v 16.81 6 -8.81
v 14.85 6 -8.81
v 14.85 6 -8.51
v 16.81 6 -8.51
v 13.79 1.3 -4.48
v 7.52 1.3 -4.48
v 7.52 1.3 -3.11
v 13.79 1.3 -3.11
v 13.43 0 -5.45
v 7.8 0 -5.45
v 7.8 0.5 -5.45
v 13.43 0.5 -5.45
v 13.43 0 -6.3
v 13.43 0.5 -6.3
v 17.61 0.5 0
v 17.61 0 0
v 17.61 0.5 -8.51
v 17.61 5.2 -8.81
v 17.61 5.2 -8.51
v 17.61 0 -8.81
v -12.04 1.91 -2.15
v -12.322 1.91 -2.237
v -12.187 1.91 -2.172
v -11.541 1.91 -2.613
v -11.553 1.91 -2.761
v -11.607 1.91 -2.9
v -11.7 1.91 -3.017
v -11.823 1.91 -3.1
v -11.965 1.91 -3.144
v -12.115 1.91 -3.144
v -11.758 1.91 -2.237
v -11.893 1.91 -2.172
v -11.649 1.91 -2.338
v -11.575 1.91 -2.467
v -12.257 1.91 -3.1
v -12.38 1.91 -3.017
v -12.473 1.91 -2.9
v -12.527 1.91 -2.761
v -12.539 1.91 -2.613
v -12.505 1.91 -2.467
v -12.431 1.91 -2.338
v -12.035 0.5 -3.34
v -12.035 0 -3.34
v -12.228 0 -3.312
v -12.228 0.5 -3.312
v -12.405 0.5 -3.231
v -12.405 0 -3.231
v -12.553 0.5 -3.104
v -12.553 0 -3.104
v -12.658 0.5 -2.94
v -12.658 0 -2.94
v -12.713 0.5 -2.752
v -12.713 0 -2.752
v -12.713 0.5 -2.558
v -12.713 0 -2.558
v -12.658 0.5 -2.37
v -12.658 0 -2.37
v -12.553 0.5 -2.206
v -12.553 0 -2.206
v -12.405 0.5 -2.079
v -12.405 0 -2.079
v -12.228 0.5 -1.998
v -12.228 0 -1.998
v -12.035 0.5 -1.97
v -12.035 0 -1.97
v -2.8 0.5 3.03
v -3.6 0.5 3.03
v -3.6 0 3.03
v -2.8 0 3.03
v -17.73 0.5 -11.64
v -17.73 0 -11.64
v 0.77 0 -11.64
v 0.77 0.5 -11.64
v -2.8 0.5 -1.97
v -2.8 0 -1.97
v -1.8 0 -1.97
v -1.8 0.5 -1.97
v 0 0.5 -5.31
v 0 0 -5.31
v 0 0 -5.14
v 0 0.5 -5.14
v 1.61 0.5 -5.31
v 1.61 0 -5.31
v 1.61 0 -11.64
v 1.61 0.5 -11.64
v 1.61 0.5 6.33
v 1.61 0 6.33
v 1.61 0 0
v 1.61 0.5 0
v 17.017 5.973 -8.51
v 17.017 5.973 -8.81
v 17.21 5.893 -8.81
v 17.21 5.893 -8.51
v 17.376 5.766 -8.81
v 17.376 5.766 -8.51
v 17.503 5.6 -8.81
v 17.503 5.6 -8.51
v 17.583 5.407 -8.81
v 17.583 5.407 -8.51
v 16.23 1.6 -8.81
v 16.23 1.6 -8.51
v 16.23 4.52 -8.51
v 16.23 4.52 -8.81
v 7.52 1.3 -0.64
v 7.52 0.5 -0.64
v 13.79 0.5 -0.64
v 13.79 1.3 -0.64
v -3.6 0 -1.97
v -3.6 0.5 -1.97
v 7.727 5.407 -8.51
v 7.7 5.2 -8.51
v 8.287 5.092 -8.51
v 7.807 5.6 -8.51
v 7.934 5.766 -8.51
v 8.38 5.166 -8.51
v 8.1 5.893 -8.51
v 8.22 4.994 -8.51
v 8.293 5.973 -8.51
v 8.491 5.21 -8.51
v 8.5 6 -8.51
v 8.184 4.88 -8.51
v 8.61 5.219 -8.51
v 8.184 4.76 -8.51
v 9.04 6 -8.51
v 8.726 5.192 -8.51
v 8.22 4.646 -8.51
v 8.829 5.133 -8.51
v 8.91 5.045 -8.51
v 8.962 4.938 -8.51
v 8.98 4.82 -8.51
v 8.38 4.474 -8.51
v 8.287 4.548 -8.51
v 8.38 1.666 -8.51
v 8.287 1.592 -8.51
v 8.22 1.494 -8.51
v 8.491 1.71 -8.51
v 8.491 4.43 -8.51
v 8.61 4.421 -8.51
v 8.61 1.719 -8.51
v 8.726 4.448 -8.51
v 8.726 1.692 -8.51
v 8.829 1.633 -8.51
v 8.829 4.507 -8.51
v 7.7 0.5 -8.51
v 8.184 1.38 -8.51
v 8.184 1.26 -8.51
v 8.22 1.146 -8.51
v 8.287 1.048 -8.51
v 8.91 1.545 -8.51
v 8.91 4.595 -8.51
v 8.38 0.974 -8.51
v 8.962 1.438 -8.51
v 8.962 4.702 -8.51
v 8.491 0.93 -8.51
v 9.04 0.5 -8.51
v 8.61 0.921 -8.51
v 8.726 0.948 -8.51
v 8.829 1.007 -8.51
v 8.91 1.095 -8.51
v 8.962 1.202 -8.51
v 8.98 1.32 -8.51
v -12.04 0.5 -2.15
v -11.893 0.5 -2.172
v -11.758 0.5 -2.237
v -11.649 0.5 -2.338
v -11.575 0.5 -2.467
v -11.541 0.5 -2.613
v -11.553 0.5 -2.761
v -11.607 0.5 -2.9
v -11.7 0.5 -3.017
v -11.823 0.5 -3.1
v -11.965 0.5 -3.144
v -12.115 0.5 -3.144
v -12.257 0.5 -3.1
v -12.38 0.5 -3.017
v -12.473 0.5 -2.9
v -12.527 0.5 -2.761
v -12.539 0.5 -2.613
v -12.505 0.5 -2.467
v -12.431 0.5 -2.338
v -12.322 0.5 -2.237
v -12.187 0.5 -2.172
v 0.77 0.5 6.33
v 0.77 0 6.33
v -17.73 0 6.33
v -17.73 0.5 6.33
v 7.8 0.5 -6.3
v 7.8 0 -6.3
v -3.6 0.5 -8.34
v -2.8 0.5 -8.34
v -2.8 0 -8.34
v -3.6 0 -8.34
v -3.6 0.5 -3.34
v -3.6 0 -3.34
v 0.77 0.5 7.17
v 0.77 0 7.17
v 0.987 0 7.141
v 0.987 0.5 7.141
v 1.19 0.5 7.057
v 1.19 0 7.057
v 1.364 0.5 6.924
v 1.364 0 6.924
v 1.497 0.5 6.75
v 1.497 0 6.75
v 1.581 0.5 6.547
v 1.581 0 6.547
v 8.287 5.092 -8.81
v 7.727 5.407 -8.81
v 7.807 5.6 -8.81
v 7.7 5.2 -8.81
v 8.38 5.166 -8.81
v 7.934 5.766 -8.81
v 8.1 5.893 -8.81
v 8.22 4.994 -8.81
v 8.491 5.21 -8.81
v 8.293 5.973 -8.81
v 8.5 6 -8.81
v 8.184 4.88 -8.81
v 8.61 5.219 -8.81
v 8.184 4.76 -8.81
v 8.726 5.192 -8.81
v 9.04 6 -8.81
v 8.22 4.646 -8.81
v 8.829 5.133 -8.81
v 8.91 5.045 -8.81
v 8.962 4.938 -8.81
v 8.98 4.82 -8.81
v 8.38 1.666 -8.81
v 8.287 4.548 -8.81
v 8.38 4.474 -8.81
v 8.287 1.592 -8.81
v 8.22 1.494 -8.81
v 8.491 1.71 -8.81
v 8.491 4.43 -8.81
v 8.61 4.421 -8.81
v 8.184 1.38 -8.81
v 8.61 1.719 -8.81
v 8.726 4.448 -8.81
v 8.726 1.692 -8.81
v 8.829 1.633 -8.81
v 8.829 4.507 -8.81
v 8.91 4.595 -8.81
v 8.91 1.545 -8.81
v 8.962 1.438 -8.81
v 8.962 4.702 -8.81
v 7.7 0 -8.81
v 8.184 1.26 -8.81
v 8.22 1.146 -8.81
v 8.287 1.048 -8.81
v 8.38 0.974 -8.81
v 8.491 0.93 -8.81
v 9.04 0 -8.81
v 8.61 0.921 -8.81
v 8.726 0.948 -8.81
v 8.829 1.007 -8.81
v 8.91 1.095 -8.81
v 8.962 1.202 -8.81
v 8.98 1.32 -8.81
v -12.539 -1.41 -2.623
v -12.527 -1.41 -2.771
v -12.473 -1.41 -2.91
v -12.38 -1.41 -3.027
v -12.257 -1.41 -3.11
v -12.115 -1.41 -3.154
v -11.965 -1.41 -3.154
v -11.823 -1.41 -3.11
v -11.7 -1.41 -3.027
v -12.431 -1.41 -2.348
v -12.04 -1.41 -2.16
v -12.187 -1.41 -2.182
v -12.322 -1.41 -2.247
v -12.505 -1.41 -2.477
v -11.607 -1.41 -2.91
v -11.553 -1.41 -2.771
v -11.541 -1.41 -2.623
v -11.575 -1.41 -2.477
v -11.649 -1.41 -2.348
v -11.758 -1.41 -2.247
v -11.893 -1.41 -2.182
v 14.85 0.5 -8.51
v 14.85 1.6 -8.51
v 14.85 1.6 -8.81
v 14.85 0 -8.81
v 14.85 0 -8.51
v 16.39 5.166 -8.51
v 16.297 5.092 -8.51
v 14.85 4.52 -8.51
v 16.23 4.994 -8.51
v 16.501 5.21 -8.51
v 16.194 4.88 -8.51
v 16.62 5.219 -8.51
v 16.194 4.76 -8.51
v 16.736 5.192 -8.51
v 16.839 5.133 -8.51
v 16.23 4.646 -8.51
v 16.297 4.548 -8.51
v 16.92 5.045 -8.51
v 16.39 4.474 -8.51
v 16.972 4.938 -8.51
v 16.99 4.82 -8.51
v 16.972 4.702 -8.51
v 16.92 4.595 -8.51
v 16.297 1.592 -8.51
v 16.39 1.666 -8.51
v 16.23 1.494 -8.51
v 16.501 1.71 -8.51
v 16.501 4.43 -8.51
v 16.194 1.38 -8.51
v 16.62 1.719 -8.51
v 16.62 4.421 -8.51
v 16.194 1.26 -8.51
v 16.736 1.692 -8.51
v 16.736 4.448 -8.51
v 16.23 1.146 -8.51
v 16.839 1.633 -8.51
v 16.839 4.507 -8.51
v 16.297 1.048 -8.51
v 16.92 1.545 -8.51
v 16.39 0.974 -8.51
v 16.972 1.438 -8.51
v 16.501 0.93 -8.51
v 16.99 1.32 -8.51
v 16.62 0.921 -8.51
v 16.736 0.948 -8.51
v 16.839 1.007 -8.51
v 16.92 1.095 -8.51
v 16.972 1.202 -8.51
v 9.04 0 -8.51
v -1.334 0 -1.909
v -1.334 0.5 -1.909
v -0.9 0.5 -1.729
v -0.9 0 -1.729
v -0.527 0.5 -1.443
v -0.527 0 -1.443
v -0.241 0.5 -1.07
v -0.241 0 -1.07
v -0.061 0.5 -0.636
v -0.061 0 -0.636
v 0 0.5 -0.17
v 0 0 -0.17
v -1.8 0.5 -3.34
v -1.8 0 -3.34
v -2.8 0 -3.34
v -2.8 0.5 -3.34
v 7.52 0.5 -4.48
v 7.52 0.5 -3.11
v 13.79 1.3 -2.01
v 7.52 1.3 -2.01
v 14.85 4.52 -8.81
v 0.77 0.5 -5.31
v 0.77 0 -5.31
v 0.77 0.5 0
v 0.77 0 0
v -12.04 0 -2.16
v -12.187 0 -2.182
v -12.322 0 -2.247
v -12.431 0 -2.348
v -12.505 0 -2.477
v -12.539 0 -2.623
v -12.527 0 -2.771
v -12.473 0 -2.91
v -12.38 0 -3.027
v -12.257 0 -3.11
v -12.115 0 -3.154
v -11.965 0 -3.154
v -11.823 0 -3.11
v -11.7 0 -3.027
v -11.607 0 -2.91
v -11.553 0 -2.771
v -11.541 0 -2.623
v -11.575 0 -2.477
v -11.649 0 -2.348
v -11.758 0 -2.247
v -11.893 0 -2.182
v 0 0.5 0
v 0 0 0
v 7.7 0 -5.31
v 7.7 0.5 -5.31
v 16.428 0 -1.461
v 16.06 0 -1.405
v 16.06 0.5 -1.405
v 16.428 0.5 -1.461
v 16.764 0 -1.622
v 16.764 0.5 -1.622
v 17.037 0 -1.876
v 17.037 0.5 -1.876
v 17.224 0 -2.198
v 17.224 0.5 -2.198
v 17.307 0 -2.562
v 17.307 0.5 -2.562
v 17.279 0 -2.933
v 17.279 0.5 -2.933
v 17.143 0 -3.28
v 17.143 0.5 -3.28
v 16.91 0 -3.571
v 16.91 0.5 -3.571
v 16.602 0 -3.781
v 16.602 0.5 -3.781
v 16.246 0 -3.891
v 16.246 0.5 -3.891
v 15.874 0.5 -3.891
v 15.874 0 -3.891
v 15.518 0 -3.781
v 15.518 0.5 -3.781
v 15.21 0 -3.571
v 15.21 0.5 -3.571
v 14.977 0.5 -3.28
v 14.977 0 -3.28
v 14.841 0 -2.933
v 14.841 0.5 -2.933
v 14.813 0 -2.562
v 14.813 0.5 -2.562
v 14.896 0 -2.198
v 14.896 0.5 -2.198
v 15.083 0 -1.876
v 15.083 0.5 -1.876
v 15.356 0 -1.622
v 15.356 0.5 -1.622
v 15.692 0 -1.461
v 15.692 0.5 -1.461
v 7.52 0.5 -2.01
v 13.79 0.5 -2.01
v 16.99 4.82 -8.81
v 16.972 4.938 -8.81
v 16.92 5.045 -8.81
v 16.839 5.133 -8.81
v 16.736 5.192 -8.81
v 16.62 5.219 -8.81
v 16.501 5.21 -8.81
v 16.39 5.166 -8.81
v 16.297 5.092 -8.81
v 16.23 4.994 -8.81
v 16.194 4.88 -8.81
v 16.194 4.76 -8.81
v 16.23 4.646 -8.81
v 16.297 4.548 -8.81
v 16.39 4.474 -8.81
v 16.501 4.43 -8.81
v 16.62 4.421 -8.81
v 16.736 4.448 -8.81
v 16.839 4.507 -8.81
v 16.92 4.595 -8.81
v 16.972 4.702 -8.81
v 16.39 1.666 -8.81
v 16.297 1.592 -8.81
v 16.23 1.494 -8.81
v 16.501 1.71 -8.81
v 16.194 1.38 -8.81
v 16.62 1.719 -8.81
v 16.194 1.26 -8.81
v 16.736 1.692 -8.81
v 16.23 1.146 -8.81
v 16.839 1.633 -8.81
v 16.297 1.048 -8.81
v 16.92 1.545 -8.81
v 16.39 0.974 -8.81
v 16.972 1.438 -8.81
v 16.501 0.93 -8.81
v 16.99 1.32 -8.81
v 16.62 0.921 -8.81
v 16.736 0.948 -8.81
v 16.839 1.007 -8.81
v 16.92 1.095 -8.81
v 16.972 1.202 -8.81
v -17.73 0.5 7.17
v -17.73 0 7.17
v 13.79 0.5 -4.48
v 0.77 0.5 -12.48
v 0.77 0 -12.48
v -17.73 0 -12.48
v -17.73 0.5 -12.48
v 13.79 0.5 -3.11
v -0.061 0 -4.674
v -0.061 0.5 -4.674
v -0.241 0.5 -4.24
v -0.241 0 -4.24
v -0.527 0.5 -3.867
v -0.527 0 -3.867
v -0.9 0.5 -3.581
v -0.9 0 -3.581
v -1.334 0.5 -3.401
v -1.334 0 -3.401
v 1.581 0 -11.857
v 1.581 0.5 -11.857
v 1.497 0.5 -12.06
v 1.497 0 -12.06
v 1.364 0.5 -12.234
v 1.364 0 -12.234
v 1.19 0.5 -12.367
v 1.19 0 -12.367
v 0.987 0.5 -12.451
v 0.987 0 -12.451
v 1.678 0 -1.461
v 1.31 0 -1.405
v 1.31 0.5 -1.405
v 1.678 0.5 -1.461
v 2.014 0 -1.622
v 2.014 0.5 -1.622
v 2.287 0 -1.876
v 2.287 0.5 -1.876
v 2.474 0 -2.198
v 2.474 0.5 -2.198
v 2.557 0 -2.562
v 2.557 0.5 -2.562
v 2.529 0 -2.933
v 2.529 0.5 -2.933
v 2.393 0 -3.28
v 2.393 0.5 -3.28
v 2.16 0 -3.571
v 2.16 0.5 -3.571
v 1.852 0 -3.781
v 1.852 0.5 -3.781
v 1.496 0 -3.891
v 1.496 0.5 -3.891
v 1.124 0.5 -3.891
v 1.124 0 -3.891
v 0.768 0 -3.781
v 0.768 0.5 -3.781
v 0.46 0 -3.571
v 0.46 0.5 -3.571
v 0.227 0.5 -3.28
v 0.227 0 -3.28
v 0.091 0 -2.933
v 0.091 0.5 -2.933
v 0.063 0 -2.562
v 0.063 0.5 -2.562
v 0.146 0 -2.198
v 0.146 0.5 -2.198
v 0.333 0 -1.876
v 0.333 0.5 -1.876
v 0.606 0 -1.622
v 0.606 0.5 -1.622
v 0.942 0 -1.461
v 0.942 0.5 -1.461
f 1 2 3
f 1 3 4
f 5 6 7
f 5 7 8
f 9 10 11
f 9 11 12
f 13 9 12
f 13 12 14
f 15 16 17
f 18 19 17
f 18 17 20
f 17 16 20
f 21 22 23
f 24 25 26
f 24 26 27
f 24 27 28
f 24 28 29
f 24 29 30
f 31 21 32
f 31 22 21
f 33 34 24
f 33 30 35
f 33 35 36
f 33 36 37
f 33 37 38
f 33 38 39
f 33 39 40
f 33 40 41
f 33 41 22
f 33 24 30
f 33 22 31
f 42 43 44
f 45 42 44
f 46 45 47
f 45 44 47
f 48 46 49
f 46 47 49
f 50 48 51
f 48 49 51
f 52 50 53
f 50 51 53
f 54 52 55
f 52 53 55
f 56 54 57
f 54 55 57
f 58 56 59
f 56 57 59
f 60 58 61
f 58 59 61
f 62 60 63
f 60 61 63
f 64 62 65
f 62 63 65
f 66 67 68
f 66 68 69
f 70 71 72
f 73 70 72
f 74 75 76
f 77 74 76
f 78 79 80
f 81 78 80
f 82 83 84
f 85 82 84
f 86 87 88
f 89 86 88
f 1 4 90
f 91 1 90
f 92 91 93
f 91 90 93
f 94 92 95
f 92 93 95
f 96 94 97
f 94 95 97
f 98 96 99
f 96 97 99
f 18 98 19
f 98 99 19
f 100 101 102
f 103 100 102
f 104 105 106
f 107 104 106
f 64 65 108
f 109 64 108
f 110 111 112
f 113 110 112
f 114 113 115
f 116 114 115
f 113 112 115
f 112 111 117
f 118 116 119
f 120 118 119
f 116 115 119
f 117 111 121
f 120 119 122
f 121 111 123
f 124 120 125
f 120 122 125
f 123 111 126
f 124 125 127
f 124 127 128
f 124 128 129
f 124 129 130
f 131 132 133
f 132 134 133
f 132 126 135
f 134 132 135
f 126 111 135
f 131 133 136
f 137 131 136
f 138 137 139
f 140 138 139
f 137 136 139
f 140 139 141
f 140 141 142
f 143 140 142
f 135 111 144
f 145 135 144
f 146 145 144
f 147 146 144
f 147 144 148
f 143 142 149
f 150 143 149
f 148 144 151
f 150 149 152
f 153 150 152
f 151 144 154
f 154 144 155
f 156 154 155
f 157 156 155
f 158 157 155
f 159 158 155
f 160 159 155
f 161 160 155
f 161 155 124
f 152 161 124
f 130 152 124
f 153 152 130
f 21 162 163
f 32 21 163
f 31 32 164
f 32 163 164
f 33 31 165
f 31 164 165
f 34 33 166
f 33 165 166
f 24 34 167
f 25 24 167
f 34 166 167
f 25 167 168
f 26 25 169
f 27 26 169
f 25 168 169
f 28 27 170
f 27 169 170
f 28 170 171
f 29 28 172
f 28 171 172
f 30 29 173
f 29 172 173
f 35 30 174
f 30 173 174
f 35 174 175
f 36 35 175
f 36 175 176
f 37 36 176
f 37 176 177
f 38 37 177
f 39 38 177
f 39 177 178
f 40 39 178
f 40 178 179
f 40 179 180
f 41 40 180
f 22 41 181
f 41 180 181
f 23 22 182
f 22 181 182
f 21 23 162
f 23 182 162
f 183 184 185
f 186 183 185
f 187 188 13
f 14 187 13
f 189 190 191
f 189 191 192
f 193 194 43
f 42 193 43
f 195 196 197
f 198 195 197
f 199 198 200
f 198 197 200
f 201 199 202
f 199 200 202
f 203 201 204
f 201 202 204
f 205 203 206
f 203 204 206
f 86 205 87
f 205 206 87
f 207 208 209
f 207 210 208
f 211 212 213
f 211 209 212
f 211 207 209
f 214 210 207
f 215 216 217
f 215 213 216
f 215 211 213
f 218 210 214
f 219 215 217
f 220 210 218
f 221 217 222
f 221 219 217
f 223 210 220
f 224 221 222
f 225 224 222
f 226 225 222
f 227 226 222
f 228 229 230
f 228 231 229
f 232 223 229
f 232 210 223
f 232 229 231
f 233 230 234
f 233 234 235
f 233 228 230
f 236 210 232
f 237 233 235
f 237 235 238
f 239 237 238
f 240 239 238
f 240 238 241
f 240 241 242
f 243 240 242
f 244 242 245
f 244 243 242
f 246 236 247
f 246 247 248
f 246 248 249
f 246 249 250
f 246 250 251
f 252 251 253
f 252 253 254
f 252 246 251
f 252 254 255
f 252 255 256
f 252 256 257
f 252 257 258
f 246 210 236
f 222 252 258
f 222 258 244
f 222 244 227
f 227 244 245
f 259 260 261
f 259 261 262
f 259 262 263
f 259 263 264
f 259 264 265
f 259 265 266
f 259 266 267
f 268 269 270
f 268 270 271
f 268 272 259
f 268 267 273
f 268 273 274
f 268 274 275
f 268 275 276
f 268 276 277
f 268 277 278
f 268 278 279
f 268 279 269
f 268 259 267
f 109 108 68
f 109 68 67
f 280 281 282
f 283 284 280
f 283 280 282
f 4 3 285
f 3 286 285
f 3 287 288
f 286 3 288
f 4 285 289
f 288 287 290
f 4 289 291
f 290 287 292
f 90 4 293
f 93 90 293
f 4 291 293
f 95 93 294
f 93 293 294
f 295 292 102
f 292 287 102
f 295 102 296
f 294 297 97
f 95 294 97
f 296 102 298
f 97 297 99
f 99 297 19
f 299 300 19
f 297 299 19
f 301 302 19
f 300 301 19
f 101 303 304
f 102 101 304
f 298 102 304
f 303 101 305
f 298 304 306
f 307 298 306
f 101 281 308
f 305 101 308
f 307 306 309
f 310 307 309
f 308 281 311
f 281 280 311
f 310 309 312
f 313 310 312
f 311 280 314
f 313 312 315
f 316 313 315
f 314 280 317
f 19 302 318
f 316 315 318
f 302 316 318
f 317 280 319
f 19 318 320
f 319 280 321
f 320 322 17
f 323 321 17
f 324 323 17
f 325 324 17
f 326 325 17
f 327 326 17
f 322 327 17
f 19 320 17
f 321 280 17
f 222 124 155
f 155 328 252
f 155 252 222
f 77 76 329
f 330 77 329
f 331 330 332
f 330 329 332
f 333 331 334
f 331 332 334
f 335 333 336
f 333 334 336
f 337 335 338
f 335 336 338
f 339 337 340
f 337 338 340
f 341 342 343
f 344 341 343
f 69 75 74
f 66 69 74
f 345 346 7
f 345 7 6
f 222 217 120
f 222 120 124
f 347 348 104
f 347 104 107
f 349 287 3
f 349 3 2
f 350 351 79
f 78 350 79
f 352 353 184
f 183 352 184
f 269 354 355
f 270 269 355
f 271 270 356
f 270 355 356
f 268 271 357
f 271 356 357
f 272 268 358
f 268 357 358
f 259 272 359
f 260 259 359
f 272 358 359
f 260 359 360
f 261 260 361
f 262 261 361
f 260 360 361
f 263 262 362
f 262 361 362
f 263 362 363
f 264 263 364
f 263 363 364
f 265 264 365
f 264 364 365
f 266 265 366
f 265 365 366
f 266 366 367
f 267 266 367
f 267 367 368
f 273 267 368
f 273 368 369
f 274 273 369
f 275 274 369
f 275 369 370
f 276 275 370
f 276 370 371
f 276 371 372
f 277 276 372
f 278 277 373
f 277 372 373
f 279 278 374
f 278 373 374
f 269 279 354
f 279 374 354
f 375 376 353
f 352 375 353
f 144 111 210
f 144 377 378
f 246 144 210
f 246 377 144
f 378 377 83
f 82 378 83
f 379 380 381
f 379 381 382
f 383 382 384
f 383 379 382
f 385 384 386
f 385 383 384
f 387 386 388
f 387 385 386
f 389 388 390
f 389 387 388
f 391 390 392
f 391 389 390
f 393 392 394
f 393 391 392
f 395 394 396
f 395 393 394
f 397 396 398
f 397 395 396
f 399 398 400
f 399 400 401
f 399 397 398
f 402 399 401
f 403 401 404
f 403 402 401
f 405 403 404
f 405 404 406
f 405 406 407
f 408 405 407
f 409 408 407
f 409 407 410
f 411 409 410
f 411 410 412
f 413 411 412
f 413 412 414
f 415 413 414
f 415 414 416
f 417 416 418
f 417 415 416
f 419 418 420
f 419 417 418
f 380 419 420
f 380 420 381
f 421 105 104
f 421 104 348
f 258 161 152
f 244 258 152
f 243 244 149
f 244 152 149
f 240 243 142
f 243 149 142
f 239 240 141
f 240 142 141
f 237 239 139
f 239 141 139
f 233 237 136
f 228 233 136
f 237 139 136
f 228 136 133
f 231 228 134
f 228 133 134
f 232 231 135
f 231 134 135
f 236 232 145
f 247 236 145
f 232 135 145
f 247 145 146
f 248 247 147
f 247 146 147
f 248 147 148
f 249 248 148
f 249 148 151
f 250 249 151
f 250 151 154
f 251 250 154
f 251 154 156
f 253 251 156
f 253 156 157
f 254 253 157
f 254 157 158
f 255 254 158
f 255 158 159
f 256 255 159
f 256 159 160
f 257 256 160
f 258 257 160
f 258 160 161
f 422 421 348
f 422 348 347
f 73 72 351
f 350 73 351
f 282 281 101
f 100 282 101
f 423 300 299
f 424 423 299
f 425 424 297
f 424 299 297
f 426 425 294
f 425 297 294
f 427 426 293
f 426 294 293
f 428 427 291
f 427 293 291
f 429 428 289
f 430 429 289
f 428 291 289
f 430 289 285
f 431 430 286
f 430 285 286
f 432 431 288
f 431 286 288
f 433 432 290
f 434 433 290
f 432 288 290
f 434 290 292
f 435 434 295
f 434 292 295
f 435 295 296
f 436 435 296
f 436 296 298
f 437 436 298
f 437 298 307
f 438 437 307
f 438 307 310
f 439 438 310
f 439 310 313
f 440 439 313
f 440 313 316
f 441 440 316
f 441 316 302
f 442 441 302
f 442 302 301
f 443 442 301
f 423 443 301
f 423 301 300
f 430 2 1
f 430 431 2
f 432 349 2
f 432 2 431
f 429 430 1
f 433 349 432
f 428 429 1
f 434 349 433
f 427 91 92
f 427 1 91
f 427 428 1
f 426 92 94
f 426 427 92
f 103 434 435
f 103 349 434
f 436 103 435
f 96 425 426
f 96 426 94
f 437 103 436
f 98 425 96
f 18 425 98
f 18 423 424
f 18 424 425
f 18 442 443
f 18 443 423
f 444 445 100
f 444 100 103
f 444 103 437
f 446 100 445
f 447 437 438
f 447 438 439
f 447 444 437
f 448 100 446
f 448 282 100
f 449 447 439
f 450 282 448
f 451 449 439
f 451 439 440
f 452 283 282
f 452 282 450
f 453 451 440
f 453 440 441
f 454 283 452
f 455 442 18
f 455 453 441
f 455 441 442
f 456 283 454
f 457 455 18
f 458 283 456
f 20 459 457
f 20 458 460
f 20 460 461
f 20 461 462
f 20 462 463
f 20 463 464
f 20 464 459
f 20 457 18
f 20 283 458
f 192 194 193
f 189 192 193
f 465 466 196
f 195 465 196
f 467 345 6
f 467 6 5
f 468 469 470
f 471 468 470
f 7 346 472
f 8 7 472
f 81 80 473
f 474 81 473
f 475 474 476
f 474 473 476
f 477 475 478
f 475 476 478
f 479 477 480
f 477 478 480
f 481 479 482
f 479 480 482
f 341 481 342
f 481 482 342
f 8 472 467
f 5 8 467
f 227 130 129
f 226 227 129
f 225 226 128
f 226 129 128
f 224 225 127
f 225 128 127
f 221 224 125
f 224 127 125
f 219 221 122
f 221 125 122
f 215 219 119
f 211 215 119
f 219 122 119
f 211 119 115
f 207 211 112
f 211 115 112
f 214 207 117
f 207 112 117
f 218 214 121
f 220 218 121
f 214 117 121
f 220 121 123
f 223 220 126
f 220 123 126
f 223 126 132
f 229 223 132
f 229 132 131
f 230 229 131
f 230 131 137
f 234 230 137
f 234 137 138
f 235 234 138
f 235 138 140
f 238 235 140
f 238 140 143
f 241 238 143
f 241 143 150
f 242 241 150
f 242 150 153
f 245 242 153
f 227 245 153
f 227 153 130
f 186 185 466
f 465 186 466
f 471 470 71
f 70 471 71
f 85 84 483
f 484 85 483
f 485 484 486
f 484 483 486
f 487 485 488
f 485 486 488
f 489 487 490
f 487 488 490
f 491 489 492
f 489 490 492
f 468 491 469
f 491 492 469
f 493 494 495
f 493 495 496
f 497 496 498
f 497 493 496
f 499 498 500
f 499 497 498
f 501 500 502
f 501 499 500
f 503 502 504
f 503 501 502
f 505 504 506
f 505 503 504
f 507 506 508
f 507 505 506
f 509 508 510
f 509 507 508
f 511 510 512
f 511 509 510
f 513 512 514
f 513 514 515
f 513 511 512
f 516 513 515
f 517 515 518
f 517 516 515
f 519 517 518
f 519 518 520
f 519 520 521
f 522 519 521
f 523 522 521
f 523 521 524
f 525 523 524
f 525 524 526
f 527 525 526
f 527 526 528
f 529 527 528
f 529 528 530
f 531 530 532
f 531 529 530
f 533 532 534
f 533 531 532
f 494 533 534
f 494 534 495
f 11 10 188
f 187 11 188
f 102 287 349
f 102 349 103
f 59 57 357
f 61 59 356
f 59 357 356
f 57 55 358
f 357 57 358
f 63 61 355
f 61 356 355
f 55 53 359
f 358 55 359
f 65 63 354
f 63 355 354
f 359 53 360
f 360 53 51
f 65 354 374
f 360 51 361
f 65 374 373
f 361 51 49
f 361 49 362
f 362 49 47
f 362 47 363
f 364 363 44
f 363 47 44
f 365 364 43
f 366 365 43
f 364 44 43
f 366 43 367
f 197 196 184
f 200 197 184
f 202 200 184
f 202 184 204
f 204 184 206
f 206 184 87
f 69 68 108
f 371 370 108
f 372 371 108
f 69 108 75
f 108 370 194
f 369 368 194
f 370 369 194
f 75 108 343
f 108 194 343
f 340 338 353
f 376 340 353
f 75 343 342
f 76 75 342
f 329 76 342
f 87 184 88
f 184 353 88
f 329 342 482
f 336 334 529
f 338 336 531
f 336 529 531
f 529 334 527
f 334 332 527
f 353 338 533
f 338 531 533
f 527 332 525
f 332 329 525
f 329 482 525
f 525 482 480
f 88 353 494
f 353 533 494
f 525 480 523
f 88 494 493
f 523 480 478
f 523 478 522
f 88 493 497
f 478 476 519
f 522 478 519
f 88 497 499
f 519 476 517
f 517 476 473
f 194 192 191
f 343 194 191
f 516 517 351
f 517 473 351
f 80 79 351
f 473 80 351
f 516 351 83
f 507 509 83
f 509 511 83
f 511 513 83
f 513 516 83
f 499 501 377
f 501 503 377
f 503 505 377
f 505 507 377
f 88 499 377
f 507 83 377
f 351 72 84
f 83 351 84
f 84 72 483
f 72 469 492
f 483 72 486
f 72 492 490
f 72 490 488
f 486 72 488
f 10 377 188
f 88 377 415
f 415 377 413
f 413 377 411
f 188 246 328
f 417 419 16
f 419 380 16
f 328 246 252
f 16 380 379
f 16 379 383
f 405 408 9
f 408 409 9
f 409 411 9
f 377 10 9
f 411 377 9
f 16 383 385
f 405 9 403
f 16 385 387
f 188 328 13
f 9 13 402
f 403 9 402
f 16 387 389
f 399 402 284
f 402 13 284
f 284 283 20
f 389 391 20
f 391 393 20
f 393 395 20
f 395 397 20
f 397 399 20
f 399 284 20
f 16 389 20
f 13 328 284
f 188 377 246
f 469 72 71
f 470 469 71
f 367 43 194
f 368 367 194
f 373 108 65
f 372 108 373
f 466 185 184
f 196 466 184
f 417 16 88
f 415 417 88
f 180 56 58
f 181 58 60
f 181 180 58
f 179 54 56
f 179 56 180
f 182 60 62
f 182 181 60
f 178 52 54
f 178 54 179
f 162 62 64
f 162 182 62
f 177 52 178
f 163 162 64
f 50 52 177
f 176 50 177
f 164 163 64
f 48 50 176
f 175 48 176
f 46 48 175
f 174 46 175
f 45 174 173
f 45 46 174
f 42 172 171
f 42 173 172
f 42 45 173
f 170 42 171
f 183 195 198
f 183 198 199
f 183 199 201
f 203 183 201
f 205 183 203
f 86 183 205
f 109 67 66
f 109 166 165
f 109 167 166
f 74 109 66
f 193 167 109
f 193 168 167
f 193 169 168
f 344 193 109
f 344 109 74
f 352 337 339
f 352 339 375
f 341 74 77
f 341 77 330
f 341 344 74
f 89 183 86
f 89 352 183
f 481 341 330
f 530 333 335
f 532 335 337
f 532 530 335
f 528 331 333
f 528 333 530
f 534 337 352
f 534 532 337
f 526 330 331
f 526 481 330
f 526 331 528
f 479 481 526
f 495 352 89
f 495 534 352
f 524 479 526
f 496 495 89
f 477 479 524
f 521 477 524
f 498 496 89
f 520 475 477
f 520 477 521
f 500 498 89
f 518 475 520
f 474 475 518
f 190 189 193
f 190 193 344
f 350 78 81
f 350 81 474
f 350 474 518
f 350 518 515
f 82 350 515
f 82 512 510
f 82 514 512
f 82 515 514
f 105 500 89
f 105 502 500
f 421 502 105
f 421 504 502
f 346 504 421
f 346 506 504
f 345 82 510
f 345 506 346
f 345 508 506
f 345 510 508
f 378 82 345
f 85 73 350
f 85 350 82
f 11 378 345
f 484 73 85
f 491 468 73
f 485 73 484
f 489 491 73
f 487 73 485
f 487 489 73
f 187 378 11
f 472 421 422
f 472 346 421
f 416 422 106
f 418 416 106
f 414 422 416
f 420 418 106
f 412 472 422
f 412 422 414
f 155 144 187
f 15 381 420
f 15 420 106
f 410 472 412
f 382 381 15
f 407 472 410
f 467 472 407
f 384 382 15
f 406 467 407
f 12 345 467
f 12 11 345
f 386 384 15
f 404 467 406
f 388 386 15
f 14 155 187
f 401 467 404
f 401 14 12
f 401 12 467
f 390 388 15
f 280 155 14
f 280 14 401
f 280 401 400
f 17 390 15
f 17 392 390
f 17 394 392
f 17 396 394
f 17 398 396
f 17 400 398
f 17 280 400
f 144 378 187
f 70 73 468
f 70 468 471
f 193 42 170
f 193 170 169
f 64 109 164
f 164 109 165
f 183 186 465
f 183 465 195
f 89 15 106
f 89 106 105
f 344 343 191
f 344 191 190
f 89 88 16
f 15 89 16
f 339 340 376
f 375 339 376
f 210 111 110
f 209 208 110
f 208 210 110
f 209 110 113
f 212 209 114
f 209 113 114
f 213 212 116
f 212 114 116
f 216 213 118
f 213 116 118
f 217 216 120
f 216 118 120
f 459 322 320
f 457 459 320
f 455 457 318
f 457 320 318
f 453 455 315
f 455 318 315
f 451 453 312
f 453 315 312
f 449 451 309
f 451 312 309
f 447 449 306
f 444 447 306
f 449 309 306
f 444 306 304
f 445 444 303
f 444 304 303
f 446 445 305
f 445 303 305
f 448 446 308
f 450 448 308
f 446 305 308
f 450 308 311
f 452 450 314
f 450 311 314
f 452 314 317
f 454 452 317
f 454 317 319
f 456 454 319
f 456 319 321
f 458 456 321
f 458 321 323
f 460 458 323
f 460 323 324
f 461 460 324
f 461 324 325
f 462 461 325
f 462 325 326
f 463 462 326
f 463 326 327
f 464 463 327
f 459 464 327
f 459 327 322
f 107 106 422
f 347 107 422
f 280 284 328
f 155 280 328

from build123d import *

# Parameters (mm, degrees)
SKETCH1_W           = 6.27
SKETCH1_H           = 1.37
SKETCH1_R           = 1.25
SKETCH1_W_2         = 5.63
SKETCH1_H_2         = 0.85
SKETCH1_R_2         = 0.685
SKETCH1_R_3         = 0.5
SKETCH1_W_3         = 1.34
SKETCH1_H_3         = 0.3
SKETCH1_W_4         = 2.76
BOSS_EXTRUDE2_DEPTH = 0.5
SKETCH4_R           = 0.5
BOSS_EXTRUDE3_DEPTH = 1.41
SKETCH5_R           = 0.5
BOSS_EXTRUDE4_DEPTH = 1.41
SKETCH6_W           = 6.27
SKETCH6_H           = 1.37
BOSS_EXTRUDE5_DEPTH = 0.8
SKETCH7_W           = 1.34
SKETCH7_H           = 0.3
SKETCH7_W_2         = 2.76
BOSS_EXTRUDE6_DEPTH = 5.5
SKETCH8_W           = 1.38
SKETCH8_H           = 2.92
CUT_EXTRUDE1_DEPTH  = 5.5
SKETCH9_R           = 0.4
CUT_EXTRUDE2_DEPTH  = 5.5
SKETCH10_R          = 0.4
CUT_EXTRUDE4_DEPTH  = 5.5
SKETCH11_W          = 0.8
SKETCH11_H          = 0.5
BOSS_EXTRUDE7_DEPTH = 5
SKETCH12_W          = 0.8
SKETCH12_H          = 0.5
BOSS_EXTRUDE8_DEPTH = 5


with BuildPart() as part:
    # Sketch1 → Boss-Extrude2 (new body)
    # profile 1 of 9: a face of its own
    with BuildSketch(Plane(origin=(0, 0, 0), x_dir=(1, 0, 0), z_dir=(0, 1, 0))):
        with BuildLine():
            Line((0, 5.31), (0, 5.14))
            ThreePointArc((0, 5.14), (-0.527207794, 3.867207794), (-1.8, 3.34))
            Line((-1.8, 3.34), (-12.035, 3.34))
            ThreePointArc((-12.035, 3.34), (-11.550631855, 3.139368145), (-11.35, 2.655))
            ThreePointArc((-11.35, 2.655), (-11.550631855, 2.170631855), (-12.035, 1.97))
            Line((-12.035, 1.97), (-1.8, 1.97))
            ThreePointArc((-1.8, 1.97), (-0.527207794, 1.442792206), (0, 0.17))
            Line((0, 0.17), (0, 0))
            Line((0, 0), (0.77, 0))
            Line((0.77, 0), (1.61, 0))
            Line((1.61, 0), (17.61, 0))
            Line((17.61, 0), (17.61, 8.51))
            Line((17.61, 8.51), (14.85, 8.51))
            Line((14.85, 8.51), (9.04, 8.51))
            Line((9.04, 8.51), (7.7, 8.51))
            Line((7.7, 8.51), (7.7, 5.31))
            Line((7.7, 5.31), (1.61, 5.31))
            Line((1.61, 5.31), (0.77, 5.31))
            Line((0.77, 5.31), (0, 5.31))
        make_face()
        with Locations((10.655, 1.325)):
            Rectangle(SKETCH1_W, SKETCH1_H, mode=Mode.SUBTRACT)
        with Locations(Location((1.31, 2.655, 0), (0, 0, 270))):
            Circle(SKETCH1_R, mode=Mode.SUBTRACT)
        with Locations((10.655, 3.795)):
            Rectangle(SKETCH1_W, SKETCH1_H, mode=Mode.SUBTRACT)
        with Locations(Location((16.06, 2.655, 0), (0, 0, 270))):
            Circle(SKETCH1_R, mode=Mode.SUBTRACT)
        with Locations((10.615, 5.875)):
            Rectangle(SKETCH1_W_2, SKETCH1_H_2, mode=Mode.SUBTRACT)
    # profile 2 of 9: a face of its own
    with BuildSketch(Plane(origin=(0, 0, 0), x_dir=(1, 0, 0), z_dir=(0, 1, 0))):
        with BuildLine():
            Line((0.77, 11.64), (0.77, 5.31))
            Line((0.77, 5.31), (1.61, 5.31))
            Line((1.61, 5.31), (1.61, 11.64))
            ThreePointArc((1.61, 11.64), (1.363969696, 12.233969696), (0.77, 12.48))
            Line((0.77, 12.48), (-17.73, 12.48))
            Line((-17.73, 12.48), (-17.73, 11.64))
            Line((-17.73, 11.64), (0.77, 11.64))
        make_face()
    # profile 3 of 9: a face of its own
    with BuildSketch(Plane(origin=(0, 0, 0), x_dir=(1, 0, 0), z_dir=(0, 1, 0))):
        with BuildLine():
            Line((1.61, 0), (0.77, 0))
            Line((0.77, 0), (0.77, -6.33))
            Line((0.77, -6.33), (-17.73, -6.33))
            Line((-17.73, -6.33), (-17.73, -7.17))
            Line((-17.73, -7.17), (0.77, -7.17))
            ThreePointArc((0.77, -7.17), (1.363969696, -6.923969696), (1.61, -6.33))
            Line((1.61, -6.33), (1.61, 0))
        make_face()
    # profile 4 of 9: a face of its own
    with BuildSketch(Plane(origin=(0, 0, 0), x_dir=(1, 0, 0), z_dir=(0, 1, 0))):
        with Locations((10.655, 1.325)):
            Rectangle(SKETCH1_W, SKETCH1_H)
    # profile 5 of 9: a face of its own
    with BuildSketch(Plane(origin=(0, 0, 0), x_dir=(1, 0, 0), z_dir=(0, 1, 0))):
        with Locations((10.655, 3.795)):
            Rectangle(SKETCH1_W, SKETCH1_H)
    # profile 6 of 9: a face of its own
    with BuildSketch(Plane(origin=(0, 0, 0), x_dir=(1, 0, 0), z_dir=(0, 1, 0))):
        with Locations((-12.035, 2.655)):
            Circle(SKETCH1_R_2)
        with Locations((-12.035, 2.655)):
            Circle(SKETCH1_R_3, mode=Mode.SUBTRACT)
    # profile 7 of 9: a face of its own
    with BuildSketch(Plane(origin=(0, 0, 0), x_dir=(1, 0, 0), z_dir=(0, 1, 0))):
        with Locations((-12.035, 2.655)):
            Circle(SKETCH1_R_3)
    # profile 8 of 9: a face of its own
    with BuildSketch(Plane(origin=(0, 0, 0), x_dir=(1, 0, 0), z_dir=(0, 1, 0))):
        with Locations((8.37, 8.66)):
            Rectangle(SKETCH1_W_3, SKETCH1_H_3)
    # profile 9 of 9: a face of its own
    with BuildSketch(Plane(origin=(0, 0, 0), x_dir=(1, 0, 0), z_dir=(0, 1, 0))):
        with Locations((16.23, 8.66)):
            Rectangle(SKETCH1_W_4, SKETCH1_H_3)
    extrude(amount=BOSS_EXTRUDE2_DEPTH)

    # Sketch4 → Boss-Extrude3 (add)
    with BuildSketch(Plane(origin=(0, 0.5, 0), x_dir=(1, 0, 0), z_dir=(0, 1, 0))):
        with Locations(Location((-12.040018383, 2.65, 0), (0, 0, 270))):
            Circle(SKETCH4_R)
    extrude(amount=BOSS_EXTRUDE3_DEPTH)

    # Sketch5 → Boss-Extrude4 (add)
    with BuildSketch(Plane.XZ):
        with Locations(Location((-12.04, -2.66, 0), (0, 0, 90))):
            Circle(SKETCH5_R)
    extrude(amount=BOSS_EXTRUDE4_DEPTH)

    # Sketch6 → Boss-Extrude5 (add)
    with BuildSketch(Plane(origin=(0, 0.5, 0), x_dir=(1, 0, 0), z_dir=(0, 1, 0))):
        with Locations((10.655, 3.795)):
            Rectangle(SKETCH6_W, SKETCH6_H)
        with Locations((10.655, 1.325)):
            Rectangle(SKETCH6_W, SKETCH6_H)
    extrude(amount=BOSS_EXTRUDE5_DEPTH)

    # Sketch7 → Boss-Extrude6 (add)
    with BuildSketch(Plane(origin=(0, 0.5, 0), x_dir=(1, 0, 0), z_dir=(0, 1, 0))):
        with Locations((8.37, 8.66)):
            Rectangle(SKETCH7_W, SKETCH7_H)
        with Locations((16.23, 8.66)):
            Rectangle(SKETCH7_W_2, SKETCH7_H)
    extrude(amount=BOSS_EXTRUDE6_DEPTH)

    # Sketch8 → Cut-Extrude1 (cut)
    with BuildSketch(Plane.XY.offset(-8.51)):
        with Locations((15.54, 3.06)):
            Rectangle(SKETCH8_W, SKETCH8_H)
    extrude(amount=-CUT_EXTRUDE1_DEPTH, mode=Mode.SUBTRACT)

    # Sketch9 → Cut-Extrude2 (cut)
    with BuildSketch(Plane.XY.offset(-8.51)):
        with BuildLine():
            ThreePointArc((7.7, 5.2), (7.934314575, 5.765685425), (8.5, 6))
            Line((8.5, 6), (7.7, 6))
            Line((7.7, 6), (7.7, 5.2))
        make_face()
        with Locations((8.58, 4.82)):
            Circle(SKETCH9_R)
        with Locations((8.58, 1.32)):
            Circle(SKETCH9_R)
    extrude(amount=-CUT_EXTRUDE2_DEPTH, mode=Mode.SUBTRACT)

    # Sketch10 → Cut-Extrude4 (cut)
    with BuildSketch(Plane.XY.offset(-8.51)):
        with Locations((16.59, 4.82)):
            Circle(SKETCH10_R)
        with BuildLine():
            Line((17.61, 6), (16.81, 6))
            ThreePointArc((16.81, 6), (17.375685425, 5.765685425), (17.61, 5.2))
            Line((17.61, 5.2), (17.61, 6))
        make_face()
        with Locations((16.59, 1.32)):
            Circle(SKETCH10_R)
    extrude(amount=-CUT_EXTRUDE4_DEPTH, mode=Mode.SUBTRACT)

    # Sketch11 → Boss-Extrude7 (add)
    with BuildSketch(Plane.XY.offset(-1.97)):
        with Locations((-3.2, 0.25)):
            Rectangle(SKETCH11_W, SKETCH11_H)
    extrude(amount=BOSS_EXTRUDE7_DEPTH)

    # Sketch12 → Boss-Extrude8 (add)
    with BuildSketch(Plane(origin=(0, 0, -3.34), x_dir=(-1, 0, 0), z_dir=(0, 0, -1))):
        with Locations((3.2, 0.25)):
            Rectangle(SKETCH12_W, SKETCH12_H)
    extrude(amount=BOSS_EXTRUDE8_DEPTH)


solid = part.part
